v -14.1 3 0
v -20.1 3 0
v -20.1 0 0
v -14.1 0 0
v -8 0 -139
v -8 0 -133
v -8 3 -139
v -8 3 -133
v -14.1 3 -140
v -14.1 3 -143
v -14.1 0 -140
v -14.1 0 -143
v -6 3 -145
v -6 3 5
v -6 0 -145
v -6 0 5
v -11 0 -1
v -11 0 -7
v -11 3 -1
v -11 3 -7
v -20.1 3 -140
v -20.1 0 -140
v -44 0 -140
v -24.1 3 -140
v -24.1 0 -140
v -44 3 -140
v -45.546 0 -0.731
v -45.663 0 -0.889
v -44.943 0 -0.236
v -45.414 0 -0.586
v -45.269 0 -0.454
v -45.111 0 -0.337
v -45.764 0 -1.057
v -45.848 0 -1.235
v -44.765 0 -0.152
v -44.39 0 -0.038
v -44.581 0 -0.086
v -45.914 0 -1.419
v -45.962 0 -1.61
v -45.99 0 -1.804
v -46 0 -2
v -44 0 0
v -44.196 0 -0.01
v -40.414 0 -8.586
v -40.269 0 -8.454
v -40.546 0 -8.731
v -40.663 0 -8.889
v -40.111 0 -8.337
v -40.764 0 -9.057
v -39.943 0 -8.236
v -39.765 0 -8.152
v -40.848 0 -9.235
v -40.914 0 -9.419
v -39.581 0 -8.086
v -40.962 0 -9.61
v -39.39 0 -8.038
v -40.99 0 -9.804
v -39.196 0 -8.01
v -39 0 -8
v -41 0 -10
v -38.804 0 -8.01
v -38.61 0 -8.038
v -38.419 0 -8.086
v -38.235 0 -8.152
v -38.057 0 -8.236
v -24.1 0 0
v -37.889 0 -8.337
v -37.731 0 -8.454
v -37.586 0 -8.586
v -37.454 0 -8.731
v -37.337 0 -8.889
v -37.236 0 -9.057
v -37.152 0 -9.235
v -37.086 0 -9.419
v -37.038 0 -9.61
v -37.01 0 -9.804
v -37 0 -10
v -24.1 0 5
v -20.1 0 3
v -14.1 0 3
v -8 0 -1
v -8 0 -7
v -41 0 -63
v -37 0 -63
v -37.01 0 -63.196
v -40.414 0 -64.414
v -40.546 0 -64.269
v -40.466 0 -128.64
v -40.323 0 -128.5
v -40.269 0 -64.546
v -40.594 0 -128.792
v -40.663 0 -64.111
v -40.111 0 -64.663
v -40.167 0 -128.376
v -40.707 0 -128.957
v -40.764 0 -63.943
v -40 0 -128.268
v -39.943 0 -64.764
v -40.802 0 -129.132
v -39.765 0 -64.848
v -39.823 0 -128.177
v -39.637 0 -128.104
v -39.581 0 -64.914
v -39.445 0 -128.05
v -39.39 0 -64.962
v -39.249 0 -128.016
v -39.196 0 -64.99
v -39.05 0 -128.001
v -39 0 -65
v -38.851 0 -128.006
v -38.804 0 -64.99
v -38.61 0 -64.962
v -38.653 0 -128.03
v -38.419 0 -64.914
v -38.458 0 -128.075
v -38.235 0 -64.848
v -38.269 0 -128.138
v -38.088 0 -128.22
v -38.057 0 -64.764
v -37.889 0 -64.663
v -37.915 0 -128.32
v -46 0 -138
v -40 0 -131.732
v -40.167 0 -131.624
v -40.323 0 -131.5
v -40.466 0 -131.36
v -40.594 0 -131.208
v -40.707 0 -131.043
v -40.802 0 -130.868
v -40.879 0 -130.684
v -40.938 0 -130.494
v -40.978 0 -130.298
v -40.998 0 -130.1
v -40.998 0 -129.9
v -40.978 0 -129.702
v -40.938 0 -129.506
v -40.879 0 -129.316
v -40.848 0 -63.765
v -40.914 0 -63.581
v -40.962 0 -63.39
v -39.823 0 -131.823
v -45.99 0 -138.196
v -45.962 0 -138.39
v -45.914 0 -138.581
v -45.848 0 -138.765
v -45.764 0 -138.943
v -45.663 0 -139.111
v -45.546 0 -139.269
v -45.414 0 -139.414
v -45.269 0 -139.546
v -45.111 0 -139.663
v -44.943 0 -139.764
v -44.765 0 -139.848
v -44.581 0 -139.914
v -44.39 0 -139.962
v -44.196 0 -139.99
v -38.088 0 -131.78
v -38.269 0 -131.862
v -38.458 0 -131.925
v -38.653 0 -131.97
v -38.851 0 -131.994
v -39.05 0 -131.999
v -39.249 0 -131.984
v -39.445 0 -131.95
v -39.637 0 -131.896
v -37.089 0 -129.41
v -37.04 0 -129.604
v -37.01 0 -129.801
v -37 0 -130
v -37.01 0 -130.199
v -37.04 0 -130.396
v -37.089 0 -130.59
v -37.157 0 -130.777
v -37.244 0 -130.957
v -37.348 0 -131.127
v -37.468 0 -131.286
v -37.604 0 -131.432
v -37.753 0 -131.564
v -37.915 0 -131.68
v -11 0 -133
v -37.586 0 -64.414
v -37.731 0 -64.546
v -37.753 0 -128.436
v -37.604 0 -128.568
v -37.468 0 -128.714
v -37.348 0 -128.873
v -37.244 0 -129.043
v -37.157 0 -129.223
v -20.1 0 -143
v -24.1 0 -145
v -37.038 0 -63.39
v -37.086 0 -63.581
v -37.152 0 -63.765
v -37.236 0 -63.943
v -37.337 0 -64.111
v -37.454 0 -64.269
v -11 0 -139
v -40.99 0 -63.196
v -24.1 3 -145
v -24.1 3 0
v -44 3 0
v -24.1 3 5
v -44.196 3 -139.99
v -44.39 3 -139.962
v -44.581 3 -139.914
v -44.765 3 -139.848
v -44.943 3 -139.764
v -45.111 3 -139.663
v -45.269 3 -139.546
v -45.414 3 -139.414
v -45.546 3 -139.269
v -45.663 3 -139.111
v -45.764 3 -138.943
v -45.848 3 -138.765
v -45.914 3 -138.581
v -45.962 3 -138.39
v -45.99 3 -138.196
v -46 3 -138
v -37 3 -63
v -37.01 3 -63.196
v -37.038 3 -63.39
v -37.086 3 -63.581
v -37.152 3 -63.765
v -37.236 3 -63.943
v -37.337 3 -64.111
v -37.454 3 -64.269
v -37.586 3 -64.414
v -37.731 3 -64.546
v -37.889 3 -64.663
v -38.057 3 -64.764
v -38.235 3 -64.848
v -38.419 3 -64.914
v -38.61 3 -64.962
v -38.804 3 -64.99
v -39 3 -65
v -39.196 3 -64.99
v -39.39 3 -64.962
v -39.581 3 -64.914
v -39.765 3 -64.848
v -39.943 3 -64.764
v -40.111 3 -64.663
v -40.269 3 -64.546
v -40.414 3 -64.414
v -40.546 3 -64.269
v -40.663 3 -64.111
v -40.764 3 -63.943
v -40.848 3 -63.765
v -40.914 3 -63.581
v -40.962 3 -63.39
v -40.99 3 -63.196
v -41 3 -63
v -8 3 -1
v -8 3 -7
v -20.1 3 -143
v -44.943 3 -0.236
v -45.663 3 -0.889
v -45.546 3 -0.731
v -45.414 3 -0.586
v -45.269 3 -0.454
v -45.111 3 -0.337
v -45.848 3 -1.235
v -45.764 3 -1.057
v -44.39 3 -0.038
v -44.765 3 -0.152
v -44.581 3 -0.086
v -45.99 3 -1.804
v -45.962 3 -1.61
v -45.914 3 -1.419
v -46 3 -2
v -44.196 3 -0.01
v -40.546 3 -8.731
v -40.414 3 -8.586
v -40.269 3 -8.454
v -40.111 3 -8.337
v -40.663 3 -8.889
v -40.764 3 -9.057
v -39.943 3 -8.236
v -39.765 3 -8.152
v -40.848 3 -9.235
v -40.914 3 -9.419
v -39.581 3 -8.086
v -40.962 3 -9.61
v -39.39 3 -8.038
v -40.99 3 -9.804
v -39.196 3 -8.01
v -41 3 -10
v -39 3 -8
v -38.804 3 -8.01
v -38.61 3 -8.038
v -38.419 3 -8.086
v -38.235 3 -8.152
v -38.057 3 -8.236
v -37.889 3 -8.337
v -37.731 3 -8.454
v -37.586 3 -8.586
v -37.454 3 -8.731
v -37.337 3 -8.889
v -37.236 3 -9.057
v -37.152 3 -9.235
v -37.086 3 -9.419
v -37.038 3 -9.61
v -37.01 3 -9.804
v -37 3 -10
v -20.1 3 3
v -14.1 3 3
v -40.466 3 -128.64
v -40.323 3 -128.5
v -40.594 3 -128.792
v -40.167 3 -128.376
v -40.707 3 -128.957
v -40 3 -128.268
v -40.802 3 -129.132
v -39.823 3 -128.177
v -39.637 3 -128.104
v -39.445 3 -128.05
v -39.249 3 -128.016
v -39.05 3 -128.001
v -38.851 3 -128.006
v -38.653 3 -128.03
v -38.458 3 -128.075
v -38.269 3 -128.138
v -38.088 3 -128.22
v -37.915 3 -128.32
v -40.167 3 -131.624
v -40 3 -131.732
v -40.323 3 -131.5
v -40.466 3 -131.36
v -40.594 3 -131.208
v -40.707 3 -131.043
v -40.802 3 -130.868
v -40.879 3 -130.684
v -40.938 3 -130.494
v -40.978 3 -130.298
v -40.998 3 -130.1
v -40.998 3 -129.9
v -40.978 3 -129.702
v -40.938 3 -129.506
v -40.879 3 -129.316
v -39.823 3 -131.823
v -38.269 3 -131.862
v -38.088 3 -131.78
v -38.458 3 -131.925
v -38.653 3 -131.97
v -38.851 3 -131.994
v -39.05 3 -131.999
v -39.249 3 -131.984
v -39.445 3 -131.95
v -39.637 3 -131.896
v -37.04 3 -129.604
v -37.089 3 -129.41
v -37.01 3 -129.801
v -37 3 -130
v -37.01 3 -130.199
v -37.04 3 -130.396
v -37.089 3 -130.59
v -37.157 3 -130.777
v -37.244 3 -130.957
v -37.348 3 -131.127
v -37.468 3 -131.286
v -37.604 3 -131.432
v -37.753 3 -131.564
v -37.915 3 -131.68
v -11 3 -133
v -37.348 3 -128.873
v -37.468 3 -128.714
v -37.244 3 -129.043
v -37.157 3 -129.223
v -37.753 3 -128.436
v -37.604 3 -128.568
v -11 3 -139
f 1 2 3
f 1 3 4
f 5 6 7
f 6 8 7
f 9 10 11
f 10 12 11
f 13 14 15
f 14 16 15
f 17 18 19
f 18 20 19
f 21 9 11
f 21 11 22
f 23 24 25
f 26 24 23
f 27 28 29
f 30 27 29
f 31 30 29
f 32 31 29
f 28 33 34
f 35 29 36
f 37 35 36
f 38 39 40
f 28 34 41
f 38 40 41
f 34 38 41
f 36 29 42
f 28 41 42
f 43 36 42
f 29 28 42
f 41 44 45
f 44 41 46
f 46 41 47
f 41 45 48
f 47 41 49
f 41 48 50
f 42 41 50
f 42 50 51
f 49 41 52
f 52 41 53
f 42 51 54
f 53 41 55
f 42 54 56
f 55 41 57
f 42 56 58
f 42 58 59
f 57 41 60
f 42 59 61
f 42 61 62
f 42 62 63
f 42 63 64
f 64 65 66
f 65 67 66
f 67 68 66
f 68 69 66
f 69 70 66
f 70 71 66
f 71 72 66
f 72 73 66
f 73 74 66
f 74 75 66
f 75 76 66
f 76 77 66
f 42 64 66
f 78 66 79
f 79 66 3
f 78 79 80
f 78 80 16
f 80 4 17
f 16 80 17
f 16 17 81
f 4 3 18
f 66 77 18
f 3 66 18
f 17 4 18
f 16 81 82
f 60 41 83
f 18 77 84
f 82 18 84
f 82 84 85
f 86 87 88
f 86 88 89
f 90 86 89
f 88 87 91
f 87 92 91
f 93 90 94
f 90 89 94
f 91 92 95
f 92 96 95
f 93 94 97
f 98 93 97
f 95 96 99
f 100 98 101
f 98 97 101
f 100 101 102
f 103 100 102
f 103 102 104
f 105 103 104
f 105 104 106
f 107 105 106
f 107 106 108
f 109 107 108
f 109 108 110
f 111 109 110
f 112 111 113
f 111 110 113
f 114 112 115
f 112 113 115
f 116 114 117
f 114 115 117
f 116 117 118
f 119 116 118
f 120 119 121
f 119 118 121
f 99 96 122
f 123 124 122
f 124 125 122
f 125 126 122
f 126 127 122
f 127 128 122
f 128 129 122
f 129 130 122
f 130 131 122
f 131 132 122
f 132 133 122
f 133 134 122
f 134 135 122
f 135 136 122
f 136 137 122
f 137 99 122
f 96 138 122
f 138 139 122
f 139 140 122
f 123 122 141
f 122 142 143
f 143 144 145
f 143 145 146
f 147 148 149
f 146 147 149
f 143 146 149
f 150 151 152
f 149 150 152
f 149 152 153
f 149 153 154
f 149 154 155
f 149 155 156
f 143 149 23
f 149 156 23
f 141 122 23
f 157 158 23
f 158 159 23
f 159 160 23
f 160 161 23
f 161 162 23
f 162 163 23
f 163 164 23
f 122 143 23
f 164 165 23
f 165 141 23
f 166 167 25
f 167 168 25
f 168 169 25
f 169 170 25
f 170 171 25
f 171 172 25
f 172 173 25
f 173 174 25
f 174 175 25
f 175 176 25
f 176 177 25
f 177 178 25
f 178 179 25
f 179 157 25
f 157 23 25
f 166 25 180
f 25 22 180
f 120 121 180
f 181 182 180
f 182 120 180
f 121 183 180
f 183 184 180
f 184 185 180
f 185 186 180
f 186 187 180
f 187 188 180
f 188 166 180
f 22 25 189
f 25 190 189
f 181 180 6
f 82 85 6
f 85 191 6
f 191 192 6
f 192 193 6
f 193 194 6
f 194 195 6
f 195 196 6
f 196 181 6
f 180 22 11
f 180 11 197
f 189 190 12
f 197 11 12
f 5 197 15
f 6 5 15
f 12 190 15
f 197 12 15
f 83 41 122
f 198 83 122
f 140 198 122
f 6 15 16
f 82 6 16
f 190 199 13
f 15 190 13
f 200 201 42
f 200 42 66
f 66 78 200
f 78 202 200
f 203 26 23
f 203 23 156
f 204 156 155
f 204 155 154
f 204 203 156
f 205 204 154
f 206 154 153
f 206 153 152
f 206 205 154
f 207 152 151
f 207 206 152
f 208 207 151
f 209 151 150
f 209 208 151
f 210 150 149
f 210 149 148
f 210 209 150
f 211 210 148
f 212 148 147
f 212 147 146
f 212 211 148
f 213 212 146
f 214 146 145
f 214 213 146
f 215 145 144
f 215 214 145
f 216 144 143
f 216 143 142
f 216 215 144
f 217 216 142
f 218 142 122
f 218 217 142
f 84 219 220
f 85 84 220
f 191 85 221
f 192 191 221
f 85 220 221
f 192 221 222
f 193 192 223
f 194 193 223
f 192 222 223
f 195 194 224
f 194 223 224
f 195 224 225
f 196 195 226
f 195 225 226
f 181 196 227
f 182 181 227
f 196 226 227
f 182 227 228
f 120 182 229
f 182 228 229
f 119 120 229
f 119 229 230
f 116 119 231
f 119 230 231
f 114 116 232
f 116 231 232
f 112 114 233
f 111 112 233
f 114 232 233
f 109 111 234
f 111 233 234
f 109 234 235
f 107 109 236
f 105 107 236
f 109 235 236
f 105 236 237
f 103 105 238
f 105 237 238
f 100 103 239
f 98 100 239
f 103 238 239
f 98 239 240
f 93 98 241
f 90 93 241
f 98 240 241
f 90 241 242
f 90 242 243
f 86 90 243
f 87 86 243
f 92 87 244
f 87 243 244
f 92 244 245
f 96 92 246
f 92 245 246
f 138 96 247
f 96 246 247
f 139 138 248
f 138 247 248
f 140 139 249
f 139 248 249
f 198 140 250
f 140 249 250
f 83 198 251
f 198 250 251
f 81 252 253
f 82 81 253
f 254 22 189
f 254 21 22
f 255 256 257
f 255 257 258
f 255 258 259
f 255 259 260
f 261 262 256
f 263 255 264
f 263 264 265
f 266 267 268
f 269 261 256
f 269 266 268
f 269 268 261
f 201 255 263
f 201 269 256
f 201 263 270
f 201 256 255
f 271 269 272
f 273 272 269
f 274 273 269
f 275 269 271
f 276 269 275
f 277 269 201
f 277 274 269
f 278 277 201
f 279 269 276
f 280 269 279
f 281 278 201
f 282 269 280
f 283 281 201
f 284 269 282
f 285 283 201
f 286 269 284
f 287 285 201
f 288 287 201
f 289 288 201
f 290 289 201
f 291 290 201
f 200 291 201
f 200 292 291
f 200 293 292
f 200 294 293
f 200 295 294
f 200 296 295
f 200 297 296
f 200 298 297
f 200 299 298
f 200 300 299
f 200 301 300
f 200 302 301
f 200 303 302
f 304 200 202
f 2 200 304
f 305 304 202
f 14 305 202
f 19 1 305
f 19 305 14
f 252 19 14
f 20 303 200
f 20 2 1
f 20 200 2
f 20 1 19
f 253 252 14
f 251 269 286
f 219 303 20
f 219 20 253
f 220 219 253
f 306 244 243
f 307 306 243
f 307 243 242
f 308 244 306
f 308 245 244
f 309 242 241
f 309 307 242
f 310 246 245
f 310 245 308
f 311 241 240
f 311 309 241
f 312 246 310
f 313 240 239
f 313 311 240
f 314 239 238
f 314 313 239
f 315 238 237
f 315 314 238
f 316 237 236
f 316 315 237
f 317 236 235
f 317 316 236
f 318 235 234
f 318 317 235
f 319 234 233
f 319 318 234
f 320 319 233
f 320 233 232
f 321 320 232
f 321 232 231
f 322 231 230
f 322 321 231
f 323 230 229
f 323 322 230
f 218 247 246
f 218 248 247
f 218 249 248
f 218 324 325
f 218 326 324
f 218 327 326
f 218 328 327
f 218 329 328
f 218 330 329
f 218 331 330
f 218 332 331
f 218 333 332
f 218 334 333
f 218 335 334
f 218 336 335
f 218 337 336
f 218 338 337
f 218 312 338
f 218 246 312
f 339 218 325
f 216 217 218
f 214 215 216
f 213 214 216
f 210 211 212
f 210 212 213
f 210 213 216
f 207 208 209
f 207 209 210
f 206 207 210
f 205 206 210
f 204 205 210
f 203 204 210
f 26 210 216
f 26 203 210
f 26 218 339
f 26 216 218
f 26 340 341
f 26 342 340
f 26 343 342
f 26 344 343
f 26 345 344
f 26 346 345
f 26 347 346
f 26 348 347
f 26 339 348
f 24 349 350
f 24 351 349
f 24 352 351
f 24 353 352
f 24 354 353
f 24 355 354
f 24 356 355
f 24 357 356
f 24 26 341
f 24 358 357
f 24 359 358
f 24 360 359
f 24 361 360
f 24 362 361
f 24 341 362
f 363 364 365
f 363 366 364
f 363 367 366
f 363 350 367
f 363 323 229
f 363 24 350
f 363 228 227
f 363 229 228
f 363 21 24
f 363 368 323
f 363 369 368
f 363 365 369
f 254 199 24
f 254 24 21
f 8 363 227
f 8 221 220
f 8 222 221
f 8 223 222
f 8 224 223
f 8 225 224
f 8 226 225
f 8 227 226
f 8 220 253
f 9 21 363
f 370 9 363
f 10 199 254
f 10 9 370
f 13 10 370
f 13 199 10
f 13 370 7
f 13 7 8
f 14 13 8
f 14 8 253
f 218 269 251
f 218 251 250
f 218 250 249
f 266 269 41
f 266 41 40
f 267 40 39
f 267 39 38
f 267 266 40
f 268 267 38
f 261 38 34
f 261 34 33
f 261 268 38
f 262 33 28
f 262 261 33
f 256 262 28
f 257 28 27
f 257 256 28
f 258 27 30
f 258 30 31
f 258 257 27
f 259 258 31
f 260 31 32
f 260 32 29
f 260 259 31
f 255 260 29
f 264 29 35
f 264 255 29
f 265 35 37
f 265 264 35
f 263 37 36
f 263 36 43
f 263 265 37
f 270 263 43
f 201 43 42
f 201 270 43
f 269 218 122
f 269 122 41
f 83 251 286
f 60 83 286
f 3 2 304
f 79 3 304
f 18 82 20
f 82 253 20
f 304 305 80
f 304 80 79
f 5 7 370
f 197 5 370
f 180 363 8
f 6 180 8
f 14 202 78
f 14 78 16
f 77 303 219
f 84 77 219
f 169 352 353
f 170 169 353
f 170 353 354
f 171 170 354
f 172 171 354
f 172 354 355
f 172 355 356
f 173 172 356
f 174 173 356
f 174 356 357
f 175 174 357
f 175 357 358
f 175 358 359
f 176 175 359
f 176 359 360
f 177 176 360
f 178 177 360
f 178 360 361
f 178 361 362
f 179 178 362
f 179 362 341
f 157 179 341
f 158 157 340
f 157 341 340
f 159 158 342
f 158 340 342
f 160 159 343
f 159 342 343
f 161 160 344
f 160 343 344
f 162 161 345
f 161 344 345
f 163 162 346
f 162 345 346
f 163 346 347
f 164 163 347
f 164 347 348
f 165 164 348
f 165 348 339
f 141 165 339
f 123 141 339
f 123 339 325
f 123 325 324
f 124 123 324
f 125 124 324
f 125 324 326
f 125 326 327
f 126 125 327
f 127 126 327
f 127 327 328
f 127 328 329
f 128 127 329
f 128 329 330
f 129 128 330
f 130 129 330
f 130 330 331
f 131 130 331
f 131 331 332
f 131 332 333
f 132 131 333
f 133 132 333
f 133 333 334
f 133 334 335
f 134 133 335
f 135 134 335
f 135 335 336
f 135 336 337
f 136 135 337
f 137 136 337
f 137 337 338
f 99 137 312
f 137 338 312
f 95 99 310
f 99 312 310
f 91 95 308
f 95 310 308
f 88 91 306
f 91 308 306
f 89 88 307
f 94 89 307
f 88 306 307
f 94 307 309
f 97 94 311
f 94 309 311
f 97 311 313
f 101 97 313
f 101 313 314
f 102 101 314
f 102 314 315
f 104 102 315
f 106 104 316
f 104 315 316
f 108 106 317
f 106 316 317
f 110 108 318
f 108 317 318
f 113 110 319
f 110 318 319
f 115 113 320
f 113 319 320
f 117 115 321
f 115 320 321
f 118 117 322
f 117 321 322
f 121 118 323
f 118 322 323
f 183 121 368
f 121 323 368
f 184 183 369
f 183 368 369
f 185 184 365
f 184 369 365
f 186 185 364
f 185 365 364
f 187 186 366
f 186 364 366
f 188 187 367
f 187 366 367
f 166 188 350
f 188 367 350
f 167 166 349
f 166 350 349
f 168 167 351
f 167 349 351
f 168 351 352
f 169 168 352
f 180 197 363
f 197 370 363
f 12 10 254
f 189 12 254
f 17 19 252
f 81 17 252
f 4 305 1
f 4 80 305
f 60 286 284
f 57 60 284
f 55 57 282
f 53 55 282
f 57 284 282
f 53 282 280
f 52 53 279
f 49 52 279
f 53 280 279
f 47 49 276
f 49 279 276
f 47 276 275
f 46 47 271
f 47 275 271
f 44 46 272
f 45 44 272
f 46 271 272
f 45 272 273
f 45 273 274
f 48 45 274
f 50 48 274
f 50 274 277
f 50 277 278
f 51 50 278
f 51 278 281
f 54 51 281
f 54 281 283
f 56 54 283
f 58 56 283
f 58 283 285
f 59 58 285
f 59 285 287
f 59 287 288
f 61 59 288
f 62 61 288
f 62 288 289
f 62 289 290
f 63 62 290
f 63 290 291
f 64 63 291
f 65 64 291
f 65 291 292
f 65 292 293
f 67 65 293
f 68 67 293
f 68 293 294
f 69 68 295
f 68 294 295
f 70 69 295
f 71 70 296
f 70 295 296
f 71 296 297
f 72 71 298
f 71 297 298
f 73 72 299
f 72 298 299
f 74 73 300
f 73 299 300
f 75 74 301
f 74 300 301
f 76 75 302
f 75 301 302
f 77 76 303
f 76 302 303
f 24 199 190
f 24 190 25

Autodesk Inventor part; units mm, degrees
ref_plane "YZ Plane" through (0, 0, 0) normal (1, 0, 0) x (0, 1, 0)
ref_plane "XZ Plane" through (0, 0, 0) normal (0, 1, 0) x (-1, 0, 0)
ref_plane "XY Plane" through (0, 0, 0) normal (0, 0, 1) x (1, 0, 0)
sketch "草圖1" plane through (0, 0, 0) normal (0, 1, 0) x (-1, 0, 0)
  line L0 (0, 0) -> (0, -140)
  line L1 (15, -140) -> (15, 0)
  line L2 (6, 0) -> (6, 3)
  line L3 (6, 3) -> (14.1, 3)
  line L4 (14.1, 3) -> (14.1, 0)
  line L5 (15, 0) -> (14.1, 0)
  line L6 (6, 0) -> (0, 0)
  line L7 (6, -140) -> (6, -143)
  line L8 (6, -143) -> (14.1, -143)
  line L9 (14.1, -143) -> (14.1, -140)
  line L10 (0, -140) -> (6, -140)
  line L11 (14.1, -140) -> (15, -140)
  dimension "d1" = 15
  dimension "d2" = 3
  dimension "d3" = 8.1
  dimension "d4" = 6
  dimension "d5" = 3
  dimension "d6" = 140
  dimension "d7" = 6
  dimension "d8" = 8.1
  dimension "d9" = 15
  dimension "d10" = 140
extrude "擠出1" add sketch "草圖1" along normal blind 3
sketch "草圖2" plane through (0, 3, 0) normal (0, 1, 0) x (1, 0, 0)
  line L0 (-11, 1) -> (-8, 1)
  line L1 (-8, 1) -> (-8, 7)
  line L2 (-8, 7) -> (-11, 7)
  line L3 (-11, 7) -> (-11, 1)
  line L4 (0, 0) -> (0, 140) projected
  line L5 (-6, 0) -> (0, 0) projected
  line L6 (-11, 133) -> (-8, 133)
  line L7 (-8, 133) -> (-8, 139)
  line L8 (-8, 139) -> (-11, 139)
  line L9 (-11, 139) -> (-11, 133)
  line L10 (0, 140) -> (-6, 140) projected
  line L11 (-15, 140) -> (-15, 0) projected
  dimension "d13" = 6
  dimension "d14" = 3
  dimension "d16" = 1
  dimension "d17" = 6
  dimension "d18" = 3
  dimension "d20" = 1
  dimension "d33" = 4
  dimension "d34" = 4
extrude "擠出2" cut sketch "草圖2" against normal up to surface (3 mm away)
sketch "草圖4" plane through (0, 3, 0) normal (0, 1, 0) x (1, 0, 0)
  line L0 (-44, 0) -> (-15, 0)
  line L1 (-15, 0) -> (-15, 140)
  line L2 (-15, 140) -> (-44, 140)
  line L3 (-46, 138) -> (-46, 2)
  line L4 (-15, 140) -> (-15, 0) projected
  line L5 (0, 140) -> (-6, 140) projected
  line L6 (-6, 0) -> (0, 0) projected
  line L7 (-39, 10) -> (-39, 63) construction
  line L8 (-37, 10) -> (-37, 63)
  line L9 (-41, 63) -> (-41, 10)
  arc A0 (-41, 10) -> (-37, 10) centre (-39, 10) ccw
  arc A1 (-37, 63) -> (-41, 63) centre (-39, 63) ccw
  circle A2 centre (-39, 130) radius 2
  arc A3 (-46, 2) -> (-44, 0) centre (-44, 2) ccw
  arc A4 (-44, 140) -> (-46, 138) centre (-44, 138) ccw
  point P0 (-39, 36.5)
  dimension "d23" = 31
  dimension "d24" = 4
  dimension "d25" = 53
  dimension "d26" = 5
  dimension "d27" = 10
  dimension "d29" = 2
  dimension "d32" = 10
extrude "擠出3" add sketch "草圖4" against normal up to surface (3 mm away)
sketch "草圖6" plane through (0, 3, 0) normal (0, 1, 0) x (1, 0, 0)
  circle A0 centre (-39, 130) radius 2 projected
  arc A1 (-41, 10) -> (-37, 10) centre (-39, 10) ccw projected
  line L0 (-41, 10) -> (-41, 63) projected
  arc A2 (-37, 63) -> (-41, 63) centre (-39, 63) ccw projected
  line L1 (-37, 63) -> (-37, 10) projected
  line L2 (-8, 7) -> (-8, 1) projected
  line L3 (-8, 1) -> (-11, 1) projected
  line L4 (-11, 1) -> (-11, 7) projected
  line L5 (-11, 7) -> (-8, 7) projected
  line L6 (-8, 133) -> (-11, 133) projected
  line L7 (-11, 133) -> (-11, 139) projected
  line L8 (-11, 139) -> (-8, 139) projected
  line L9 (-8, 139) -> (-8, 133) projected
  line L10 (0, 0) -> (0, 140) projected
  line L11 (0, 140) -> (-6, 140) projected
  line L12 (-6, 140) -> (-6, 143) projected
  line L13 (-6, 143) -> (-14.1, 143) projected
  line L14 (-14.1, 143) -> (-14.1, 140) projected
  line L15 (-14.1, 140) -> (-44, 140) projected
  arc A3 (-44, 140) -> (-46, 138) centre (-44, 138) ccw projected
  line L16 (-46, 138) -> (-46, 2) projected
  arc A4 (-46, 2) -> (-44, 0) centre (-44, 2) ccw projected
  line L17 (-44, 0) -> (-14.1, 0) projected
  line L18 (-14.1, 0) -> (-14.1, -3) projected
  line L19 (-14.1, -3) -> (-6, -3) projected
  line L20 (-6, -3) -> (-6, 0) projected
  line L21 (-6, 0) -> (0, 0) projected
  line L22 (-6, 140) -> (-6, 143) projected
  line L23 (-6, 0) -> (-6, 140)
extrude "擠出4" cut sketch "草圖6" against normal blind 3 contours L21 L23 L11 L10
ref_plane "工作平面1" through (-39, 3, -10) normal (1, 0, 0) x (0, 0, -1)
sketch "草圖8" plane through (0, 3, 0) normal (0, 1, 0) x (1, 0, 0)
  line L0 (-6, -3) -> (-6, 143) projected
  line L1 (-6, -3) -> (-20.1, -3)
  line L2 (-20.1, -3) -> (-20.1, -5)
  line L3 (-20.1, -5) -> (-6, -5)
  line L4 (-6, -5) -> (-6, -3)
  line L5 (-44, 0) -> (-14.1, 0) projected
  line L6 (-20.1, -5) -> (-24.1, -5)
  line L7 (-24.1, -5) -> (-24.1, 0)
  line L8 (-24.1, 0) -> (-20.1, 0)
  line L9 (-20.1, 0) -> (-20.1, -5)
  line L10 (-14.1, 0) -> (-14.1, -3) projected
  line L11 (-6, 143) -> (-20.1, 143)
  line L12 (-20.1, 143) -> (-20.1, 145)
  line L13 (-20.1, 145) -> (-6, 145)
  line L14 (-6, 145) -> (-6, 143)
  line L15 (-14.1, 140) -> (-44, 140) projected
  line L16 (-20.1, 145) -> (-24.1, 145)
  line L17 (-24.1, 145) -> (-24.1, 140)
  line L18 (-24.1, 140) -> (-20.1, 140)
  line L19 (-20.1, 140) -> (-20.1, 145)
  line L20 (-14.1, 143) -> (-14.1, 140) projected
  point P0 (0, 0)
  dimension "d40" = 6
  dimension "d41" = 2
  dimension "d42" = 4
  dimension "d45" = 6
  dimension "d46" = 2
  dimension "d47" = 4
extrude "擠出5" add sketch "草圖8" against normal up to surface (3 mm away) contours L11 L12 L13 L14 | L4 L3 L2 L1 | L2 L6 L7 L5 L9 | L19 L15 L17 L16 L12
sketch "草圖9" plane through (0, 3, 0) normal (0, 1, 0) x (1, 0, 0)
  line L0 (-6, -5) -> (-6, 145) projected
  line L1 (-6, 145) -> (-24.1, 145) projected
  line L2 (-24.1, 145) -> (-24.1, 140) projected
  line L3 (-24.1, 140) -> (-44, 140) projected
  arc A0 (-44, 140) -> (-46, 138) centre (-44, 138) ccw projected
  line L4 (-46, 138) -> (-46, 2) projected
  arc A1 (-46, 2) -> (-44, 0) centre (-44, 2) ccw projected
  line L5 (-44, 0) -> (-24.1, 0) projected
  line L6 (-24.1, 0) -> (-24.1, -5) projected
  line L7 (-24.1, -5) -> (-6, -5) projected
  line L8 (-14.1, -3) -> (-20.1, -3) projected
  line L9 (-20.1, -3) -> (-20.1, 0) projected
  line L10 (-20.1, 0) -> (-14.1, 0) projected
  line L11 (-14.1, 0) -> (-14.1, -3) projected
  line L12 (-20.1, 140) -> (-20.1, 143) projected
  line L13 (-20.1, 143) -> (-14.1, 143) projected
  line L14 (-14.1, 143) -> (-14.1, 140) projected
  line L15 (-14.1, 140) -> (-20.1, 140) projected
  circle A2 centre (-39, 130) radius 2 projected
  arc A3 (-41, 10) -> (-37, 10) centre (-39, 10) ccw projected
  line L16 (-41, 10) -> (-41, 63) projected
  arc A4 (-37, 63) -> (-41, 63) centre (-39, 63) ccw projected
  line L17 (-37, 63) -> (-37, 10) projected
  line L18 (-8, 7) -> (-8, 1) projected
  line L19 (-8, 1) -> (-11, 1) projected
  line L20 (-11, 1) -> (-11, 7) projected
  line L21 (-11, 7) -> (-8, 7) projected
  line L22 (-8, 133) -> (-11, 133) projected
  line L23 (-11, 133) -> (-11, 139) projected
  line L24 (-11, 139) -> (-8, 139) projected
  line L25 (-8, 139) -> (-8, 133) projected
  point P0 (0, 0)
equation "\"d10\" = d6"
equation "\"d20\" = d16"
properties part number "chassis_1_2"
